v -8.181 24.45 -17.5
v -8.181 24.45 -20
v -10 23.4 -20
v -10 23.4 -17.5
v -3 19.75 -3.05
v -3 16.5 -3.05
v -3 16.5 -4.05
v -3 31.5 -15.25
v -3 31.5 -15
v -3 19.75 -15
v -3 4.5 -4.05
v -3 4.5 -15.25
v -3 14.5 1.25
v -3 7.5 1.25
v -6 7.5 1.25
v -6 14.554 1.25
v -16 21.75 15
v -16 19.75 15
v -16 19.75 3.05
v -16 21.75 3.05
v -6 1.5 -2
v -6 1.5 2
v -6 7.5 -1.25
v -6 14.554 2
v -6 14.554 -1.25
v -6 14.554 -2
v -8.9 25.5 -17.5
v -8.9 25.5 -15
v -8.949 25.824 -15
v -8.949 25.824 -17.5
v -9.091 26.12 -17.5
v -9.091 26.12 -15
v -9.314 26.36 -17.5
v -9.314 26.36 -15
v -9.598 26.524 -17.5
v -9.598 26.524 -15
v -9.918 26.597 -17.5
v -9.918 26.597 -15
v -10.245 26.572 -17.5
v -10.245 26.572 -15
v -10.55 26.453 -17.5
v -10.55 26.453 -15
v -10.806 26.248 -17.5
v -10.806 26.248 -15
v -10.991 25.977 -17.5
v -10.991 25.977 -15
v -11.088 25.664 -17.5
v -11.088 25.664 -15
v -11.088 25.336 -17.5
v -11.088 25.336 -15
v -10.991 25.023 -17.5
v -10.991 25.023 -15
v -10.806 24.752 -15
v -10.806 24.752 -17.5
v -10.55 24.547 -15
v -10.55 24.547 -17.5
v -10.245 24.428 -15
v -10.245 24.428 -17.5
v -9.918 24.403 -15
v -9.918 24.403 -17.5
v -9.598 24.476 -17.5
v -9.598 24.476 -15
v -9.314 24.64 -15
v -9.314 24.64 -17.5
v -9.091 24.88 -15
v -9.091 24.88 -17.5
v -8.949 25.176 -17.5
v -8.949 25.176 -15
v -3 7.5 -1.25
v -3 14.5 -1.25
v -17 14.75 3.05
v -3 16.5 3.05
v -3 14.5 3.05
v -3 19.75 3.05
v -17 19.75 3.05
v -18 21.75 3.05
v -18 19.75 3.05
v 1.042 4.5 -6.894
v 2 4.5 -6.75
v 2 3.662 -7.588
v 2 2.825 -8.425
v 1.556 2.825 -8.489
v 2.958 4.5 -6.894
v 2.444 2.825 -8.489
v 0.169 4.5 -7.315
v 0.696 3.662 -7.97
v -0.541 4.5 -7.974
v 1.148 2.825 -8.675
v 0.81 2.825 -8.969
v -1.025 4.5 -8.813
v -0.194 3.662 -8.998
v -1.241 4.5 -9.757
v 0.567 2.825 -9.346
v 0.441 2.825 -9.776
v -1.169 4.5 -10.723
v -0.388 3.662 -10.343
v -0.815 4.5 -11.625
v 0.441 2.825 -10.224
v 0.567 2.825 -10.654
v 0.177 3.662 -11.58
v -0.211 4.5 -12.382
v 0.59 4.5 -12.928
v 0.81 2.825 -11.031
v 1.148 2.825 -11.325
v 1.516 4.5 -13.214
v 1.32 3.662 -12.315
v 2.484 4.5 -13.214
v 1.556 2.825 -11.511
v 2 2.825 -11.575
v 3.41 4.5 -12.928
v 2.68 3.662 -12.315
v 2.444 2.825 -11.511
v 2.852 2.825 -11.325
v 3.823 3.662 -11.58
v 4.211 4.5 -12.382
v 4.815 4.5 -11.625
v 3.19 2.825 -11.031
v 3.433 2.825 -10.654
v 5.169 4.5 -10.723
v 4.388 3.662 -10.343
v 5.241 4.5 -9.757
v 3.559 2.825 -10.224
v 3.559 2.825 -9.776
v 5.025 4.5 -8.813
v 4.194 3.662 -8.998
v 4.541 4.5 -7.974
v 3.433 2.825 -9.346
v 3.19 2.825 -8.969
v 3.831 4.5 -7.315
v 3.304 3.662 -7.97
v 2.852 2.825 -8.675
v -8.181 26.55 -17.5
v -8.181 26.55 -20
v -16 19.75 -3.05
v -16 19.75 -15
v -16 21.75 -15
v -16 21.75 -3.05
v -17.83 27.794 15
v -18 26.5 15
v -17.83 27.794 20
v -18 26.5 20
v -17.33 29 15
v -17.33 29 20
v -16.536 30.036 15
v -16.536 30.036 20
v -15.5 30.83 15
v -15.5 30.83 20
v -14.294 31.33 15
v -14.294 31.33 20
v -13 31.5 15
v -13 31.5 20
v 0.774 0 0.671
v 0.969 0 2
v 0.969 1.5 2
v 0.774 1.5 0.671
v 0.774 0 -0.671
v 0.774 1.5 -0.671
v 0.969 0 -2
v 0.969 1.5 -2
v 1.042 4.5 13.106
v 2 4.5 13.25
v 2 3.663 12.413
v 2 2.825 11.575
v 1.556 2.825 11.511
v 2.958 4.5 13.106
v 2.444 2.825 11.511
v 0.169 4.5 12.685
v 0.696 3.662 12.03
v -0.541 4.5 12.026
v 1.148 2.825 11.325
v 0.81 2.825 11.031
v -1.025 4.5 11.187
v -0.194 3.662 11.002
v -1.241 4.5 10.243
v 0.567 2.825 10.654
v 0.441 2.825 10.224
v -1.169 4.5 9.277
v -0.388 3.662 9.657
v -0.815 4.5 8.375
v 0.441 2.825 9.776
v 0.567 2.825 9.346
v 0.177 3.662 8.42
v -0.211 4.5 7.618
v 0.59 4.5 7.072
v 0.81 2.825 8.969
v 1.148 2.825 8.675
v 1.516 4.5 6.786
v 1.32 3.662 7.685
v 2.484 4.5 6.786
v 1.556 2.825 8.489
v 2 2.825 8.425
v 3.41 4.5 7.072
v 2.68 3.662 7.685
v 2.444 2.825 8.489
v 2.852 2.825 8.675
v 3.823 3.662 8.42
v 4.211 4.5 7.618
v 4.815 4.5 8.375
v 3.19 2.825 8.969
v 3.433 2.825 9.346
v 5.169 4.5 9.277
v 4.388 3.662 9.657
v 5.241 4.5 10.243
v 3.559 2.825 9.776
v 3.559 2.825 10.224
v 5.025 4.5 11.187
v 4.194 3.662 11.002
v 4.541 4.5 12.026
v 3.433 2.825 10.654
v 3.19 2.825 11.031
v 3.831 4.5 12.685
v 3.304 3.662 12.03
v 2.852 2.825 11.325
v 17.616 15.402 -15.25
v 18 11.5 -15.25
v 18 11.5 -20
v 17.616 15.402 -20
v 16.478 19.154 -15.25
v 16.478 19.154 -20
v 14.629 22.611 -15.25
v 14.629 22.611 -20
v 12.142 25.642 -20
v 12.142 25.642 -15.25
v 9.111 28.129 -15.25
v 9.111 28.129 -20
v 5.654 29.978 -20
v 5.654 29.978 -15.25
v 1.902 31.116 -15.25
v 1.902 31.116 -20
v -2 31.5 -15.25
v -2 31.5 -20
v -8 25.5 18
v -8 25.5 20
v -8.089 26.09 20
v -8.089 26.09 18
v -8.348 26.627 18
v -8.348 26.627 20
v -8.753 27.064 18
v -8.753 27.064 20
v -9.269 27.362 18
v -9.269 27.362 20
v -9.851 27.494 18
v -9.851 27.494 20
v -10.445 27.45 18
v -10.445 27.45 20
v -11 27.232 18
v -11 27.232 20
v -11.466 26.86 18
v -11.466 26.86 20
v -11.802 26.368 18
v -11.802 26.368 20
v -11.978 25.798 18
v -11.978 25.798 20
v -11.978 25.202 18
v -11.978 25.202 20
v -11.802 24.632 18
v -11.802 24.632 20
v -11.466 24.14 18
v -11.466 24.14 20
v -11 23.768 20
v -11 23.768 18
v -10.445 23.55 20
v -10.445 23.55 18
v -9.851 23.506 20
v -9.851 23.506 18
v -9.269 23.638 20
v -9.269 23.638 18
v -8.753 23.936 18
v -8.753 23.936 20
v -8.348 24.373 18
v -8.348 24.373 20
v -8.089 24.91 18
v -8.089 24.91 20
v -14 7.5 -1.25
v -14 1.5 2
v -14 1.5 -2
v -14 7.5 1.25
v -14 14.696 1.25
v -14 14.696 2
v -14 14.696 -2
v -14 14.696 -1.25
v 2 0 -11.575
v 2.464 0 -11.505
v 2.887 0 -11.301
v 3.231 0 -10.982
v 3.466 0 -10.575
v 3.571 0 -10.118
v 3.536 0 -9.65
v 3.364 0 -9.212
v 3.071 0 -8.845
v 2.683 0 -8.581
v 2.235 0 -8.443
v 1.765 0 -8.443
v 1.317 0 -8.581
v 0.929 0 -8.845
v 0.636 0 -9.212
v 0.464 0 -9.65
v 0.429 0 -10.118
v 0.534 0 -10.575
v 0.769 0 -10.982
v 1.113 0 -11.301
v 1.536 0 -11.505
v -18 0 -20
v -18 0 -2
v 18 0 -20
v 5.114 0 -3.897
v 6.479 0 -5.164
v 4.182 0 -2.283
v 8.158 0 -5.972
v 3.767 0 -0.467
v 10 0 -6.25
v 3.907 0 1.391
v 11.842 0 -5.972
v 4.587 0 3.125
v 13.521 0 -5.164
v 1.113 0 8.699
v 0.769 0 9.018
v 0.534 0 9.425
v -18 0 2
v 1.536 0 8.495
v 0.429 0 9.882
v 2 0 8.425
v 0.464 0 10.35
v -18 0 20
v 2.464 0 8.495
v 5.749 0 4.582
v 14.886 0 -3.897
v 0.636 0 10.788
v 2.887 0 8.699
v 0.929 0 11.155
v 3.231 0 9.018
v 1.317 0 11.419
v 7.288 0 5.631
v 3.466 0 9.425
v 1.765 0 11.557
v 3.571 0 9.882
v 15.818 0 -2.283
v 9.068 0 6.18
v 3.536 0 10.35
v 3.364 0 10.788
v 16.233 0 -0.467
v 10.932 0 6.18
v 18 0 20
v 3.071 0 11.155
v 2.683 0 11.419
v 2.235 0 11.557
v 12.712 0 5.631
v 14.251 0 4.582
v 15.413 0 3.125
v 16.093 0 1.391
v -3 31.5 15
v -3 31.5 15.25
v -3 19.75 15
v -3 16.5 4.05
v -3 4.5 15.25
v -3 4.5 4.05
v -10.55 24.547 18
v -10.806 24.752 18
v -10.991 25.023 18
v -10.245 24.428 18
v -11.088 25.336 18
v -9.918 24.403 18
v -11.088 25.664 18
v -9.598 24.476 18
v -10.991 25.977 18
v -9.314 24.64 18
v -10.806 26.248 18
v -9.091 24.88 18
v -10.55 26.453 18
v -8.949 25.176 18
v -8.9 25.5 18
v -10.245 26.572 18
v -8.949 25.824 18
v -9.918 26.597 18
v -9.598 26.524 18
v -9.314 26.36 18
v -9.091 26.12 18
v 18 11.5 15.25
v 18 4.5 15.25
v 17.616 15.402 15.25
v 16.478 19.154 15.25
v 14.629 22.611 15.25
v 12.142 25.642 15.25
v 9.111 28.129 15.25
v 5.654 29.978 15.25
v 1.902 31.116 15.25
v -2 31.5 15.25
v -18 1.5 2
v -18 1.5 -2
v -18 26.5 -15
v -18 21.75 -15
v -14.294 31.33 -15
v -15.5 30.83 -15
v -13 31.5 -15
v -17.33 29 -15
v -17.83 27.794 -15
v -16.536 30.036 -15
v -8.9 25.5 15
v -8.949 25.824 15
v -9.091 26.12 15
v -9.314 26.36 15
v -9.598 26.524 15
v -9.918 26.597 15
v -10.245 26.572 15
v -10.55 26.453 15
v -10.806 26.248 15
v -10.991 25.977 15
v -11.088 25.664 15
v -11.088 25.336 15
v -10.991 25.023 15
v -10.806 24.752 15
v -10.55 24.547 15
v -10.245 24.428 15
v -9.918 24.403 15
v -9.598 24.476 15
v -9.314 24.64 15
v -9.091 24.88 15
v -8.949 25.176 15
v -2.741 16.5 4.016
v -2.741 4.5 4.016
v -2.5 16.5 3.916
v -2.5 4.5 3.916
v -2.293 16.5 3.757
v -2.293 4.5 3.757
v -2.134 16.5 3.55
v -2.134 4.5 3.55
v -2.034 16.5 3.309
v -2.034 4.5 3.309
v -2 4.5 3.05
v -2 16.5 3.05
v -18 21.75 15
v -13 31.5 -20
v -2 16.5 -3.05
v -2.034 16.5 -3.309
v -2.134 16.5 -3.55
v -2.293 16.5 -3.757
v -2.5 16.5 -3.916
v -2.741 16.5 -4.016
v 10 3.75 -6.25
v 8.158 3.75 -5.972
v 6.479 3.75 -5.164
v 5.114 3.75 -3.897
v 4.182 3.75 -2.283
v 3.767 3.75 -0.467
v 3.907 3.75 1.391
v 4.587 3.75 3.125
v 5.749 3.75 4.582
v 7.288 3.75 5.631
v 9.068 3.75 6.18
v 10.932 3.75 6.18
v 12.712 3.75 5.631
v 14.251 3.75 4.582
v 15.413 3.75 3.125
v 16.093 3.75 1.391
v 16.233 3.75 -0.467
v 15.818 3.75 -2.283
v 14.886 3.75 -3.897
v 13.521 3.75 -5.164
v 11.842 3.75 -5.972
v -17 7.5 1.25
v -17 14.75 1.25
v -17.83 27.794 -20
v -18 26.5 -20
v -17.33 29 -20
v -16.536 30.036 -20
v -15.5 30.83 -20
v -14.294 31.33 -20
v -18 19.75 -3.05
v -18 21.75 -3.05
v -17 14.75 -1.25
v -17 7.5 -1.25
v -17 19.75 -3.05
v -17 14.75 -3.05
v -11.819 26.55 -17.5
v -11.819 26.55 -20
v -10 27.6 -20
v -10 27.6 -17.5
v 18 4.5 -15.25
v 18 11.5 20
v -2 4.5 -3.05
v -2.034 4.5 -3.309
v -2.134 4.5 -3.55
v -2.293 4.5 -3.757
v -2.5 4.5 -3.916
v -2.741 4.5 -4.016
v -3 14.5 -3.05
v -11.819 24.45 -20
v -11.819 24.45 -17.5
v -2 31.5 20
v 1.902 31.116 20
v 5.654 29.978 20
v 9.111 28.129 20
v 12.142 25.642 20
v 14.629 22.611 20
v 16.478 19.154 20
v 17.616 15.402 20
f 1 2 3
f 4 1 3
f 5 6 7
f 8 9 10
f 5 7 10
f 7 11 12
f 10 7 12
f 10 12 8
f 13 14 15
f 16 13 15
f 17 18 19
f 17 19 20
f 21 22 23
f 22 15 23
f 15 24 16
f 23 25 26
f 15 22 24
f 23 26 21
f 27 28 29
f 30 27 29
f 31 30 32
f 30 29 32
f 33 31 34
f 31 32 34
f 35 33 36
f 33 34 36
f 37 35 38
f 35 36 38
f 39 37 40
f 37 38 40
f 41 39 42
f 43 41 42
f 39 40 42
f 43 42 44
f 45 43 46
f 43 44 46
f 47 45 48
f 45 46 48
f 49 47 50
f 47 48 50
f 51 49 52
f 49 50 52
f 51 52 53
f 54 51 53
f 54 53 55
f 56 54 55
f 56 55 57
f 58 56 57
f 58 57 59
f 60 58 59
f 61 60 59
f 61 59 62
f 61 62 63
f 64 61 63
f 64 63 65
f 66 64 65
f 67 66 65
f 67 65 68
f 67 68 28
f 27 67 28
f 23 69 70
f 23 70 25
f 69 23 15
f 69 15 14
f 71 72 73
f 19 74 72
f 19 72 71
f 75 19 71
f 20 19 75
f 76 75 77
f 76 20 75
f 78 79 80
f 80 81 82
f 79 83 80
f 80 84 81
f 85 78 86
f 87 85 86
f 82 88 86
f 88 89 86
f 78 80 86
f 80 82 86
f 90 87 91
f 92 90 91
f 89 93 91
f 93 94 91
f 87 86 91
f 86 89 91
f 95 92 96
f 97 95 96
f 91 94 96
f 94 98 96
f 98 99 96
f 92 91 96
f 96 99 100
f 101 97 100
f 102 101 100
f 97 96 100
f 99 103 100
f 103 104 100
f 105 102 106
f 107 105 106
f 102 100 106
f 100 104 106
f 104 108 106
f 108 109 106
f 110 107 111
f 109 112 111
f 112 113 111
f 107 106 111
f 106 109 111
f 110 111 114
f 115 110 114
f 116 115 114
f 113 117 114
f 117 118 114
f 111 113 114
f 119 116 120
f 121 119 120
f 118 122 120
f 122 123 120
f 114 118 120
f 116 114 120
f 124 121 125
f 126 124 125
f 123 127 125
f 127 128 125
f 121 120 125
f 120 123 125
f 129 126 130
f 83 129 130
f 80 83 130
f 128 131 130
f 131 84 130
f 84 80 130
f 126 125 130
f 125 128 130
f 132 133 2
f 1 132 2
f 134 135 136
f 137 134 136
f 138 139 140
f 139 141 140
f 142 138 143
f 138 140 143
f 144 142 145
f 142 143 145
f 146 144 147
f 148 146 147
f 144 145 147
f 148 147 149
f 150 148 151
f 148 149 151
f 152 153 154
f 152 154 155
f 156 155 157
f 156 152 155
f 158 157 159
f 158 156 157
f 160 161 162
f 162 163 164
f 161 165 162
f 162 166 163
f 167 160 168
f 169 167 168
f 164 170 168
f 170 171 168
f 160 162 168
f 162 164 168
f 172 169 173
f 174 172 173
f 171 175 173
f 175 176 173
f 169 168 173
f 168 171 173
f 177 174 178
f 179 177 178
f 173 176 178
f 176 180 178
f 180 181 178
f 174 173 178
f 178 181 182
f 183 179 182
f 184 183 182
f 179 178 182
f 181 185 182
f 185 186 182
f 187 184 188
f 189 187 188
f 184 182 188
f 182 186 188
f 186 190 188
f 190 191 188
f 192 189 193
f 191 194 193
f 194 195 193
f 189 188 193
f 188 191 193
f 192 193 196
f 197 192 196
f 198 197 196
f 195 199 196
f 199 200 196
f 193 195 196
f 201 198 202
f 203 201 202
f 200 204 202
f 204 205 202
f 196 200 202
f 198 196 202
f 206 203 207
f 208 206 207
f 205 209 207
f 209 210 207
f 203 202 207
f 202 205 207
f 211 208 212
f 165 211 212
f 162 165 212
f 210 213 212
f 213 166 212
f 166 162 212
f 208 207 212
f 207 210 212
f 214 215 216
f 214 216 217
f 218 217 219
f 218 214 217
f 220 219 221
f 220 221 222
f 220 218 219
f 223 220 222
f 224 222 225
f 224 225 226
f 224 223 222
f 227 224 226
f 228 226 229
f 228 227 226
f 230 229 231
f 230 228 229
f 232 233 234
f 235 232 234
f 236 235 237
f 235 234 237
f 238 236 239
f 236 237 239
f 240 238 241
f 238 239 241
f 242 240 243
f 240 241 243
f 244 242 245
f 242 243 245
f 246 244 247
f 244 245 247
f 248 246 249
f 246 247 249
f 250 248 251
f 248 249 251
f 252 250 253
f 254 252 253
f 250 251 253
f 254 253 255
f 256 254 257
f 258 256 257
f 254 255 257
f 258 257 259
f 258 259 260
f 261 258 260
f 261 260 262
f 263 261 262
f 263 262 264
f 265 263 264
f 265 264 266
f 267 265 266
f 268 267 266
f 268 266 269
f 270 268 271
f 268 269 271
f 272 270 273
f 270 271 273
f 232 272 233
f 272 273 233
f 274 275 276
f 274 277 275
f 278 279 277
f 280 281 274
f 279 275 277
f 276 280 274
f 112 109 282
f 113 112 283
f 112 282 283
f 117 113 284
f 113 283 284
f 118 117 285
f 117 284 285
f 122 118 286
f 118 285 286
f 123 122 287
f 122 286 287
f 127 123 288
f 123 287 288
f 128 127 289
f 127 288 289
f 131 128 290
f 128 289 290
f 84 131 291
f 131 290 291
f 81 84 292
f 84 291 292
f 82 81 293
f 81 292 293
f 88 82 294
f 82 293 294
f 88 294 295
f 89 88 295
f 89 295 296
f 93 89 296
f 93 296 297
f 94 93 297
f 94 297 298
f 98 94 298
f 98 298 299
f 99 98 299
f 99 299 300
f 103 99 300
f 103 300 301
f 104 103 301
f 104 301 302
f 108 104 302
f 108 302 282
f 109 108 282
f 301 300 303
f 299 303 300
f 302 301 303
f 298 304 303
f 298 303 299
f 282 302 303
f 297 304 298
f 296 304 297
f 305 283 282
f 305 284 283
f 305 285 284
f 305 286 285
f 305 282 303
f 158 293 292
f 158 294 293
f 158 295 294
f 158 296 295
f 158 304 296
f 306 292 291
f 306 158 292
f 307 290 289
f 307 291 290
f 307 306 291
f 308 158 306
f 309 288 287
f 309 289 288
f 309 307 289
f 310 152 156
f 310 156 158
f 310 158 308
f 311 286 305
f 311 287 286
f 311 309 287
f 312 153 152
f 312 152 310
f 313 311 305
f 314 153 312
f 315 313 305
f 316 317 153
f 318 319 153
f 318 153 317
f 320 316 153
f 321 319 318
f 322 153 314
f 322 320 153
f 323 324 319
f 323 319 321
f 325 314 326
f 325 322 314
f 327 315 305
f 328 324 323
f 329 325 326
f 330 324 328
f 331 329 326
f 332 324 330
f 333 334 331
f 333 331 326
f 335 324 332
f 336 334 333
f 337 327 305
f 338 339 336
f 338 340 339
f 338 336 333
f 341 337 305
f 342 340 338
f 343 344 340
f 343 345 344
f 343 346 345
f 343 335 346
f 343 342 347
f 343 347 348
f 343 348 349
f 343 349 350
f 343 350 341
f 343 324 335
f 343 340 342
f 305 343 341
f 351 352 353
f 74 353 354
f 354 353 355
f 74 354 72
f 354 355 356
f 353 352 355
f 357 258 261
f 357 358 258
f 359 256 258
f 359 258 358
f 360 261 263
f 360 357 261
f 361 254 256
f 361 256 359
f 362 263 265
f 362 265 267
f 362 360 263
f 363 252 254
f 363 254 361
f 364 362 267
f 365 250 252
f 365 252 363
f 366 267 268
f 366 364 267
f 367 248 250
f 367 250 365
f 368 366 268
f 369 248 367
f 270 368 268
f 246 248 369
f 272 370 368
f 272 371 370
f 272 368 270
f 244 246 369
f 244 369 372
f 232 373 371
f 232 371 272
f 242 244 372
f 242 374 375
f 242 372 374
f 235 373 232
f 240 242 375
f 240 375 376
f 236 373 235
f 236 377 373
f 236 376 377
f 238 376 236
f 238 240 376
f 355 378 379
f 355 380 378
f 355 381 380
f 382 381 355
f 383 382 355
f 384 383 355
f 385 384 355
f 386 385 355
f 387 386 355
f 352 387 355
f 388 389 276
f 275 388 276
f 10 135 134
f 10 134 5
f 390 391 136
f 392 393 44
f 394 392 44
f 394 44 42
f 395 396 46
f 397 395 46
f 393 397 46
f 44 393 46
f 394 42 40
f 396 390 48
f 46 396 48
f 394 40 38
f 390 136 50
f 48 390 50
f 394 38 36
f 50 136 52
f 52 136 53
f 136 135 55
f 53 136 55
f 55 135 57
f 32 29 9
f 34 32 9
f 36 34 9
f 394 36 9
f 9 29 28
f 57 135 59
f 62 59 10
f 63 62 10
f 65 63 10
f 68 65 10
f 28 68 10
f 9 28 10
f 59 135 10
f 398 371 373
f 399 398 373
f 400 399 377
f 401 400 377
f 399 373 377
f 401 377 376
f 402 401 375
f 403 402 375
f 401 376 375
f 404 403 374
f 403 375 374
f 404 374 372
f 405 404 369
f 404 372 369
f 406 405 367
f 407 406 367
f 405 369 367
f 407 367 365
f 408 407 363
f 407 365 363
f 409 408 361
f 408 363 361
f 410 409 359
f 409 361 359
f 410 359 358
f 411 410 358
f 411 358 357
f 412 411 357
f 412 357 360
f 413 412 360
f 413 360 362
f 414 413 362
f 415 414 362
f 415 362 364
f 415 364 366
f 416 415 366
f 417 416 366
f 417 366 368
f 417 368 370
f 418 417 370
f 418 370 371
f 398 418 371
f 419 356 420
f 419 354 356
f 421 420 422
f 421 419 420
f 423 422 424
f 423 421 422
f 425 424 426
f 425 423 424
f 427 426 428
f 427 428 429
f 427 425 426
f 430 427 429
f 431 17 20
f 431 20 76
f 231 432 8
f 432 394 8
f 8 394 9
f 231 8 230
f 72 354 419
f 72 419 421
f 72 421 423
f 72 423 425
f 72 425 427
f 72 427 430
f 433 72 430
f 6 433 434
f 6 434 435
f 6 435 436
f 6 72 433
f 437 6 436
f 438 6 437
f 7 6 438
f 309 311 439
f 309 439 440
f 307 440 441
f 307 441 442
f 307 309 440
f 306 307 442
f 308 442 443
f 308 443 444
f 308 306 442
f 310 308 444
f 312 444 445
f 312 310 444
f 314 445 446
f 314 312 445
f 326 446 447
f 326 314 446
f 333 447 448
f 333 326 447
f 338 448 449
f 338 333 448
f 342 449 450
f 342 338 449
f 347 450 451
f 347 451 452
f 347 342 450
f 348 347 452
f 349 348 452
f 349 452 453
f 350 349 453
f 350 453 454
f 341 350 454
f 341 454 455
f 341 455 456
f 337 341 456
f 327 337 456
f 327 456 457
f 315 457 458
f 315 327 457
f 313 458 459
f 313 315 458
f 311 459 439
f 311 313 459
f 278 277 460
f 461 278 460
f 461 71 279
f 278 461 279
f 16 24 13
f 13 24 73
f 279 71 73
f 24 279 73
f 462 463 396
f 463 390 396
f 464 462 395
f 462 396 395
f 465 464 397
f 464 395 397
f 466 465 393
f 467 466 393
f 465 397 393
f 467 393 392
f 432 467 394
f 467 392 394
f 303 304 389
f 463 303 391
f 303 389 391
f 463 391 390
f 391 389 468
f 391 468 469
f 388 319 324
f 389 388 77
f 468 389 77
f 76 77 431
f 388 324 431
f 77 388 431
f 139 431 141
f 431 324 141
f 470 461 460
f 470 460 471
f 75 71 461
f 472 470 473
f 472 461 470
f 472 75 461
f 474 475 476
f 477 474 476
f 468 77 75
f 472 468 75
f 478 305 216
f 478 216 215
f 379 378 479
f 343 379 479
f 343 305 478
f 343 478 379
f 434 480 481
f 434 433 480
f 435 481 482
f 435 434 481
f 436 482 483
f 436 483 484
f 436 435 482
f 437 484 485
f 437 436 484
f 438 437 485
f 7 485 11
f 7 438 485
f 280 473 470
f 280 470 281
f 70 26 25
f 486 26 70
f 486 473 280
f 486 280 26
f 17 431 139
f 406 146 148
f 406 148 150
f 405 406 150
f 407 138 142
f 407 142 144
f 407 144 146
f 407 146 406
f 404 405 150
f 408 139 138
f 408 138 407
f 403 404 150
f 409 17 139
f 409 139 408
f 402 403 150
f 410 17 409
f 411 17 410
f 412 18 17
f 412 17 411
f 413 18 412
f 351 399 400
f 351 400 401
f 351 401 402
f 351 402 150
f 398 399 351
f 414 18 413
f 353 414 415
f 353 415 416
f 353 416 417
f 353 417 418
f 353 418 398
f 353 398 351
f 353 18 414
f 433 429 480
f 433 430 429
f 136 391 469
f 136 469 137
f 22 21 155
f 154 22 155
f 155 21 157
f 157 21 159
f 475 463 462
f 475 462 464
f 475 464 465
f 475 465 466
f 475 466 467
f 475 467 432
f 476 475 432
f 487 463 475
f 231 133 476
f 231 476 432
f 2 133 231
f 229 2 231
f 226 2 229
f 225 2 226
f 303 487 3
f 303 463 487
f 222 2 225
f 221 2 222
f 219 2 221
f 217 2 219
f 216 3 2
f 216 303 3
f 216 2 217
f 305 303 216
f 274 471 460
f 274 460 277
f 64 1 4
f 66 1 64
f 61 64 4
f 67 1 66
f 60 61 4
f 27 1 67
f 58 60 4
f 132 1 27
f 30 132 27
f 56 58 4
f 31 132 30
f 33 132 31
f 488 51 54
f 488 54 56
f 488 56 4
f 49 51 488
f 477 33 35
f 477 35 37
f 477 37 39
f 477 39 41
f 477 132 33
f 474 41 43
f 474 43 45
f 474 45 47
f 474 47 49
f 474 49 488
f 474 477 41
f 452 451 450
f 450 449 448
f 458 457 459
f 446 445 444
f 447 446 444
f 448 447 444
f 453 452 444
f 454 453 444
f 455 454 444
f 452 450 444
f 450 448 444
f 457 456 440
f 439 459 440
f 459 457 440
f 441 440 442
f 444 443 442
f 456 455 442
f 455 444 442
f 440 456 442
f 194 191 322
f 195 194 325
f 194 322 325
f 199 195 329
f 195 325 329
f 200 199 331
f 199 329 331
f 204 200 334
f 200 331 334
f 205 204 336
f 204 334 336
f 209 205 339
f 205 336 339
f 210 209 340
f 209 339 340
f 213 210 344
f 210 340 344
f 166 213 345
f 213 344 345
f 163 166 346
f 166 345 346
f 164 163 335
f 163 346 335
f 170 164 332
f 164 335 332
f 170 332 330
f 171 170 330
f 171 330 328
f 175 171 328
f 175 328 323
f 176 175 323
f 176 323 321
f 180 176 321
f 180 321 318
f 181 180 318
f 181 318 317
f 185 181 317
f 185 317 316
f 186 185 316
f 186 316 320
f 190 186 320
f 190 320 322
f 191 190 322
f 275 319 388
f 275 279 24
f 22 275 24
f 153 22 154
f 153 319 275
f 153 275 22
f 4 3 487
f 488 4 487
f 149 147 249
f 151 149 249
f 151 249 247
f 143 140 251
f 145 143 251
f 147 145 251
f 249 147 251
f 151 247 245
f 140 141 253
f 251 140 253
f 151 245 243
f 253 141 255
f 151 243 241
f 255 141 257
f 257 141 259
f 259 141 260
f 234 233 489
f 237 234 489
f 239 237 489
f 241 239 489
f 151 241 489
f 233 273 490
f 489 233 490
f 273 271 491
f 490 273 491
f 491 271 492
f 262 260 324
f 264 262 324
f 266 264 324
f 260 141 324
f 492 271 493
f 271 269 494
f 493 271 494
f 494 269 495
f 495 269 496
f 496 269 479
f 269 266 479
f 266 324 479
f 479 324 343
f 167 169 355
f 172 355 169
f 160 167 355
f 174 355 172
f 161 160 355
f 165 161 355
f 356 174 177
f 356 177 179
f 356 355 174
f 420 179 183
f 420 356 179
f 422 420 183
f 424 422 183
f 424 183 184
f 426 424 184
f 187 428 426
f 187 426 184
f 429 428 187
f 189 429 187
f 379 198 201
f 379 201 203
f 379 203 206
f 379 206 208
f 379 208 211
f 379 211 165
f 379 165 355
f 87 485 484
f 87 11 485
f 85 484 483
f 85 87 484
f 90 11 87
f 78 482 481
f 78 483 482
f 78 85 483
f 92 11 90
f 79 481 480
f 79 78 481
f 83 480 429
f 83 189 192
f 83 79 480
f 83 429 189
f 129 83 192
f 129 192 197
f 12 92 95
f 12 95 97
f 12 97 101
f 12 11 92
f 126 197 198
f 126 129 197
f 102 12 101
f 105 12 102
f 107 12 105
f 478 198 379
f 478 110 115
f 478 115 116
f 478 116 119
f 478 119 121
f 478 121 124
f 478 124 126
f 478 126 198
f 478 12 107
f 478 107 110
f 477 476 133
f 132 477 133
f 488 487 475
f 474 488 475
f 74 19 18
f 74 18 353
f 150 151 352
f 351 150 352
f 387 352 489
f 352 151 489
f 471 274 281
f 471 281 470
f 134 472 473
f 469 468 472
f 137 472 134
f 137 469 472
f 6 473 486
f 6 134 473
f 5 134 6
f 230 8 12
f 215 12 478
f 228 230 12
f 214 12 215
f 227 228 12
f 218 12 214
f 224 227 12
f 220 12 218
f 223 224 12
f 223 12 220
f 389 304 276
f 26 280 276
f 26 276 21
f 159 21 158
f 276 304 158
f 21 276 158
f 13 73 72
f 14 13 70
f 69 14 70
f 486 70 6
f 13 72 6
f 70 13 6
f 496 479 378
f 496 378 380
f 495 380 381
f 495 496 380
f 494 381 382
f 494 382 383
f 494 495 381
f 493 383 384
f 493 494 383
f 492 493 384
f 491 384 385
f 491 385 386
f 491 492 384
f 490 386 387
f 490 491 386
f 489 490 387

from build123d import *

# Parameters (mm, degrees)
BASE_W                              = 36
BASE_H                              = 30
BOSS_EXTRUDE1_DEPTH                 = 4.5
WALLS_W                             = 36
WALLS_H                             = 5
WALLS_EXT_DEPTH                     = 31.5
SWITCH_BLOCK_W                      = 15
SWITCH_BLOCK_H                      = 30
SWITCH_BLOCK_EXT_DEPTH              = 15.25
MAGNET_POCKET_R                     = 6.25
MAGNET_POCKET_CUT_DEPTH             = 3.75
FILLET1_R                           = 5
FILLET2_R                           = 5
FILLET3_R                           = 20
FILLET4_R                           = 20
SWITCH_PLACE_W                      = 14
SWITCH_PLACE_H                      = 6.1
SWITCH_POCKET_DEPTH                 = 5.25
SWITCH_CONTACTS_W                   = 14
SWITCH_CONTACTS_H                   = 2.5
SWITCH_LEADS_DEPTH                  = 7
SWITCH_ANGLE_LEFT_DEPTH             = 1.8
SWITCH_ANGLE_RIGHT_DEPTH            = 1.8
SKETCH20_W                          = 8.1
SKETCH20_H                          = 12
BOSS_EXTRUDE5_DEPTH                 = 1
FILLET5_R                           = 1
FILLET6_R                           = 1
WIRE_GUIDE_W                        = 8
WIRE_GUIDE_H                        = 4
WIRE_PASS_THROUGH_DEPTH             = 7.5
WIRE_PASS_THROUGH_DIRECTION_2_REACH = 38.056
WIRE_CHANNEL_OUTLINE_W              = 4
WIRE_CHANNEL_OUTLINE_H              = 4
WIRE_CHANNEL_DEPTH                  = 1.5
ACHSE_R                             = 1.1
M2_ACHSE_DEPTH                      = 55.002314765
M2_NUT_DEPTH                        = 2.5
SKETCH2_R                           = 1.575
M3_MOUNTING_SCREWS_DEPTH            = 4.5
SKETCH9_W                           = 2
SKETCH9_H                           = 2
BOSS_EXTRUDE3_DEPTH                 = 11.95
SKETCH10_W                          = 2
SKETCH10_H                          = 2
BOSS_EXTRUDE4_DEPTH                 = 11.95
SKETCH19_R                          = 2
SCREW_HEAD_DEPTH                    = 2
SKETCH21_W                          = 21
SKETCH21_H                          = 27
CUT_EXTRUDE2_DEPTH                  = 0.25
SKETCH22_W                          = 21
SKETCH22_H                          = 27
CUT_EXTRUDE3_DEPTH                  = 0.25


# Read off the part's stored shape, not the designer's step: Wire Channel
with BuildPart() as part:
    # Base → Boss-Extrude1 (new body)
    with BuildSketch(Plane(origin=(0, 0, 0), x_dir=(1, 0, 0), z_dir=(0, 1, 0))):
        Rectangle(BASE_W, BASE_H)
    extrude(amount=BOSS_EXTRUDE1_DEPTH)

    # Walls → Walls Ext (add)
    with BuildSketch(Plane.XZ):
        with Locations((0, 17.5)):
            Rectangle(WALLS_W, WALLS_H)
        with Locations((0, -17.5)):
            Rectangle(WALLS_W, WALLS_H)
    extrude(amount=-WALLS_EXT_DEPTH)

    # Switch Block → Switch Block Ext (add)
    with BuildSketch(Plane(origin=(0, 4.5, 0), x_dir=(1, 0, 0), z_dir=(0, 1, 0))):
        with Locations((-10.5, 0)):
            Rectangle(SWITCH_BLOCK_W, SWITCH_BLOCK_H)
    extrude(amount=SWITCH_BLOCK_EXT_DEPTH)

    # Magnet Pocket → Magnet Pocket Cut (cut)
    with BuildSketch(Plane(origin=(0, 0, 0), x_dir=(1, 0, 0), z_dir=(0, 1, 0))):
        with Locations(Location((10, 0, 0), (0, 0, 90))):
            Circle(MAGNET_POCKET_R)
    extrude(amount=MAGNET_POCKET_CUT_DEPTH, mode=Mode.SUBTRACT)

    # Fillet1
    fillet1_edges = [part.edges().sort_by_distance(p)[0] for p in [
        (-18, 31.5, -17.5),
    ]]
    fillet(fillet1_edges, radius=FILLET1_R)

    # Fillet2
    fillet2_edges = [part.edges().sort_by_distance(p)[0] for p in [
        (-18, 31.5, 17.5),
    ]]
    fillet(fillet2_edges, radius=FILLET2_R)

    # Fillet3
    fillet3_edges = [part.edges().sort_by_distance(p)[0] for p in [
        (18, 31.5, -17.5),
    ]]
    fillet(fillet3_edges, radius=FILLET3_R)

    # Fillet4
    fillet4_edges = [part.edges().sort_by_distance(p)[0] for p in [
        (18, 31.5, 17.5),
    ]]
    fillet(fillet4_edges, radius=FILLET4_R)

    # Switch Place → Switch Pocket (cut)
    with BuildSketch(Plane(origin=(0, 19.75, 0), x_dir=(1, 0, 0), z_dir=(0, 1, 0))):
        with Locations((-10, 0)):
            Rectangle(SWITCH_PLACE_W, SWITCH_PLACE_H)
    extrude(amount=-SWITCH_POCKET_DEPTH, mode=Mode.SUBTRACT)

    # Switch Contacts → Switch Leads (cut)
    with BuildSketch(Plane(origin=(0, 14.5, 0), x_dir=(1, 0, 0), z_dir=(0, 1, 0))):
        with Locations((-10, 0)):
            Rectangle(SWITCH_CONTACTS_W, SWITCH_CONTACTS_H)
    extrude(amount=-SWITCH_LEADS_DEPTH, mode=Mode.SUBTRACT)

    # Sketch16 → Switch Angle Left (add)
    with BuildSketch(Plane(origin=(0, 0, 3.05), x_dir=(-1, 0, 0), z_dir=(0, 0, -1))):
        Polygon((17, 14.5), (17, 14.75), (3, 14.5), align=None)
    extrude(amount=SWITCH_ANGLE_LEFT_DEPTH)

    # Sketch17 → Switch Angle Right (add)
    with BuildSketch(Plane.XY.offset(-3.05)):
        Polygon((-17, 14.5), (-17, 14.75), (-3, 14.5), align=None)
    extrude(amount=SWITCH_ANGLE_RIGHT_DEPTH)

    # Sketch20 → Boss-Extrude5 (add)
    with BuildSketch(Plane(origin=(-3, 0, 0), x_dir=(0, 0, -1), z_dir=(1, 0, 0))):
        with Locations((0, 10.5)):
            Rectangle(SKETCH20_W, SKETCH20_H)
    extrude(amount=BOSS_EXTRUDE5_DEPTH)

    # Fillet5
    fillet5_edges = [part.edges().sort_by_distance(p)[0] for p in [
        (-2, 10.5, 4.05),
    ]]
    fillet(fillet5_edges, radius=FILLET5_R - 0.0001)  # a hair under: the kernel refuses the full size

    # Fillet6
    fillet6_edges = [part.edges().sort_by_distance(p)[0] for p in [
        (-2, 10.5, -4.05),
    ]]
    fillet(fillet6_edges, radius=FILLET6_R - 0.0001)  # a hair under: the kernel refuses the full size

    # Wire Guide → Wire pass through (cut)
    with BuildSketch(Plane(origin=(0, 7.5, 0), x_dir=(1, 0, 0), z_dir=(0, 1, 0))):
        with Locations((-10, 0)):
            Rectangle(WIRE_GUIDE_W, WIRE_GUIDE_H)
    extrude(amount=-WIRE_PASS_THROUGH_DEPTH, mode=Mode.SUBTRACT)

    # Wire pass through direction 2: up to this plane
    wire_pass_through_direction_2_end = Plane(origin=(-17, 14.75, -12.752231965), z_dir=(-0.017854296416882947, -0.9998405993454447, 0))
    # Wire Guide → Wire pass through direction 2 (cut, up to the surface)
    with BuildSketch(Plane(origin=(0, 7.5, 0), x_dir=(1, 0, 0), z_dir=(0, 1, 0)), mode=Mode.PRIVATE) as wire_pass_through_direction_2_sk1:
        with Locations((-10, 0)):
            Rectangle(WIRE_GUIDE_W, WIRE_GUIDE_H)
    wire_pass_through_direction_2_tool1 = split(extrude(wire_pass_through_direction_2_sk1.sketch, amount=WIRE_PASS_THROUGH_DIRECTION_2_REACH, mode=Mode.PRIVATE), bisect_by=wire_pass_through_direction_2_end, keep=Keep.BOTH, mode=Mode.PRIVATE)
    add(wire_pass_through_direction_2_tool1.solids().sort_by_distance((-10, 7.5, 0))[0], mode=Mode.SUBTRACT)

    # Wire Channel outline → Wire Channel (cut)
    with BuildSketch(Plane(origin=(0, 0, 0), x_dir=(1, 0, 0), z_dir=(0, 1, 0))):
        with Locations((-16, 0)):
            Rectangle(WIRE_CHANNEL_OUTLINE_W, WIRE_CHANNEL_OUTLINE_H)
        with BuildLine():
            Line((-6, 2), (-6, -2))
            Line((-6, -2), (0.968804066, -2))
            ThreePointArc((0.968804066, -2), (0.75, 0), (0.968804066, 2))
            Line((0.968804066, 2), (-6, 2))
        make_face()
    extrude(amount=WIRE_CHANNEL_DEPTH, mode=Mode.SUBTRACT)

    # Achse → M2 Achse (cut, through all)
    with BuildSketch(Plane.XY.offset(20)):
        with Locations((-10, 25.5)):
            Circle(ACHSE_R)
    extrude(amount=-M2_ACHSE_DEPTH, mode=Mode.SUBTRACT)

    # Sketch5 → M2 Nut (cut)
    with BuildSketch(Plane(origin=(0, 0, -20), x_dir=(-1, 0, 0), z_dir=(0, 0, -1))):
        Polygon((10, 27.6), (8.181346652, 26.55), (8.181346652, 24.45), (10, 23.4), (11.818653348, 24.45), (11.818653348, 26.55), align=None)
    extrude(amount=-M2_NUT_DEPTH, mode=Mode.SUBTRACT)

    # Sketch2 → M3 Mounting Screws (cut)
    with BuildSketch(Plane.XZ):
        with Locations(Location((2, -10, 0), (0, 0, 270))):
            Circle(SKETCH2_R)
        with Locations(Location((2, 10, 0), (0, 0, 270))):
            Circle(SKETCH2_R)
    extrude(amount=-M3_MOUNTING_SCREWS_DEPTH, mode=Mode.SUBTRACT)

    # M3 Senkkopf cone 1 section (through the dimple's axis) → M3 Senkkopf (revolve, cut)
    with BuildSketch(Plane(origin=(2, 4.5, 10), x_dir=(0, 0, 1), z_dir=(1, 0, 0))):
        Polygon((0, 0), (3.25, 0), (0, 3.25), align=None)
    revolve(axis=Axis((2, 4.5, 10), (0, -1, 0)), mode=Mode.SUBTRACT)

    # M3 Senkkopf cone 2 section (through the dimple's axis) → M3 Senkkopf cone 2 (revolve, cut)
    with BuildSketch(Plane(origin=(2, 4.5, -10), x_dir=(0, 0, 1), z_dir=(1, 0, 0))):
        Polygon((0, 0), (3.25, 0), (0, 3.25), align=None)
    revolve(axis=Axis((2, 4.5, -10), (0, -1, 0)), mode=Mode.SUBTRACT)

    # Sketch9 → Boss-Extrude3 (add)
    with BuildSketch(Plane.XY.offset(-15)):
        with Locations((-17, 20.75)):
            Rectangle(SKETCH9_W, SKETCH9_H)
    extrude(amount=BOSS_EXTRUDE3_DEPTH)

    # Sketch10 → Boss-Extrude4 (add)
    with BuildSketch(Plane(origin=(0, 0, 15), x_dir=(-1, 0, 0), z_dir=(0, 0, -1))):
        with Locations((17, 20.75)):
            Rectangle(SKETCH10_W, SKETCH10_H)
    extrude(amount=BOSS_EXTRUDE4_DEPTH)

    # Sketch19 → Screw Head (cut)
    with BuildSketch(Plane.XY.offset(20)):
        with Locations((-10, 25.5)):
            Circle(SKETCH19_R)
    extrude(amount=-SCREW_HEAD_DEPTH, mode=Mode.SUBTRACT)

    # Sketch21 → Cut-Extrude2 (cut)
    with BuildSketch(Plane(origin=(0, 0, 15), x_dir=(-1, 0, 0), z_dir=(0, 0, -1))):
        with Locations((-7.5, 18)):
            Rectangle(SKETCH21_W, SKETCH21_H)
    extrude(amount=-CUT_EXTRUDE2_DEPTH, mode=Mode.SUBTRACT)

    # Sketch22 → Cut-Extrude3 (cut)
    with BuildSketch(Plane.XY.offset(-15)):
        with Locations((7.5, 18)):
            Rectangle(SKETCH22_W, SKETCH22_H)
    extrude(amount=-CUT_EXTRUDE3_DEPTH, mode=Mode.SUBTRACT)


solid = part.part
